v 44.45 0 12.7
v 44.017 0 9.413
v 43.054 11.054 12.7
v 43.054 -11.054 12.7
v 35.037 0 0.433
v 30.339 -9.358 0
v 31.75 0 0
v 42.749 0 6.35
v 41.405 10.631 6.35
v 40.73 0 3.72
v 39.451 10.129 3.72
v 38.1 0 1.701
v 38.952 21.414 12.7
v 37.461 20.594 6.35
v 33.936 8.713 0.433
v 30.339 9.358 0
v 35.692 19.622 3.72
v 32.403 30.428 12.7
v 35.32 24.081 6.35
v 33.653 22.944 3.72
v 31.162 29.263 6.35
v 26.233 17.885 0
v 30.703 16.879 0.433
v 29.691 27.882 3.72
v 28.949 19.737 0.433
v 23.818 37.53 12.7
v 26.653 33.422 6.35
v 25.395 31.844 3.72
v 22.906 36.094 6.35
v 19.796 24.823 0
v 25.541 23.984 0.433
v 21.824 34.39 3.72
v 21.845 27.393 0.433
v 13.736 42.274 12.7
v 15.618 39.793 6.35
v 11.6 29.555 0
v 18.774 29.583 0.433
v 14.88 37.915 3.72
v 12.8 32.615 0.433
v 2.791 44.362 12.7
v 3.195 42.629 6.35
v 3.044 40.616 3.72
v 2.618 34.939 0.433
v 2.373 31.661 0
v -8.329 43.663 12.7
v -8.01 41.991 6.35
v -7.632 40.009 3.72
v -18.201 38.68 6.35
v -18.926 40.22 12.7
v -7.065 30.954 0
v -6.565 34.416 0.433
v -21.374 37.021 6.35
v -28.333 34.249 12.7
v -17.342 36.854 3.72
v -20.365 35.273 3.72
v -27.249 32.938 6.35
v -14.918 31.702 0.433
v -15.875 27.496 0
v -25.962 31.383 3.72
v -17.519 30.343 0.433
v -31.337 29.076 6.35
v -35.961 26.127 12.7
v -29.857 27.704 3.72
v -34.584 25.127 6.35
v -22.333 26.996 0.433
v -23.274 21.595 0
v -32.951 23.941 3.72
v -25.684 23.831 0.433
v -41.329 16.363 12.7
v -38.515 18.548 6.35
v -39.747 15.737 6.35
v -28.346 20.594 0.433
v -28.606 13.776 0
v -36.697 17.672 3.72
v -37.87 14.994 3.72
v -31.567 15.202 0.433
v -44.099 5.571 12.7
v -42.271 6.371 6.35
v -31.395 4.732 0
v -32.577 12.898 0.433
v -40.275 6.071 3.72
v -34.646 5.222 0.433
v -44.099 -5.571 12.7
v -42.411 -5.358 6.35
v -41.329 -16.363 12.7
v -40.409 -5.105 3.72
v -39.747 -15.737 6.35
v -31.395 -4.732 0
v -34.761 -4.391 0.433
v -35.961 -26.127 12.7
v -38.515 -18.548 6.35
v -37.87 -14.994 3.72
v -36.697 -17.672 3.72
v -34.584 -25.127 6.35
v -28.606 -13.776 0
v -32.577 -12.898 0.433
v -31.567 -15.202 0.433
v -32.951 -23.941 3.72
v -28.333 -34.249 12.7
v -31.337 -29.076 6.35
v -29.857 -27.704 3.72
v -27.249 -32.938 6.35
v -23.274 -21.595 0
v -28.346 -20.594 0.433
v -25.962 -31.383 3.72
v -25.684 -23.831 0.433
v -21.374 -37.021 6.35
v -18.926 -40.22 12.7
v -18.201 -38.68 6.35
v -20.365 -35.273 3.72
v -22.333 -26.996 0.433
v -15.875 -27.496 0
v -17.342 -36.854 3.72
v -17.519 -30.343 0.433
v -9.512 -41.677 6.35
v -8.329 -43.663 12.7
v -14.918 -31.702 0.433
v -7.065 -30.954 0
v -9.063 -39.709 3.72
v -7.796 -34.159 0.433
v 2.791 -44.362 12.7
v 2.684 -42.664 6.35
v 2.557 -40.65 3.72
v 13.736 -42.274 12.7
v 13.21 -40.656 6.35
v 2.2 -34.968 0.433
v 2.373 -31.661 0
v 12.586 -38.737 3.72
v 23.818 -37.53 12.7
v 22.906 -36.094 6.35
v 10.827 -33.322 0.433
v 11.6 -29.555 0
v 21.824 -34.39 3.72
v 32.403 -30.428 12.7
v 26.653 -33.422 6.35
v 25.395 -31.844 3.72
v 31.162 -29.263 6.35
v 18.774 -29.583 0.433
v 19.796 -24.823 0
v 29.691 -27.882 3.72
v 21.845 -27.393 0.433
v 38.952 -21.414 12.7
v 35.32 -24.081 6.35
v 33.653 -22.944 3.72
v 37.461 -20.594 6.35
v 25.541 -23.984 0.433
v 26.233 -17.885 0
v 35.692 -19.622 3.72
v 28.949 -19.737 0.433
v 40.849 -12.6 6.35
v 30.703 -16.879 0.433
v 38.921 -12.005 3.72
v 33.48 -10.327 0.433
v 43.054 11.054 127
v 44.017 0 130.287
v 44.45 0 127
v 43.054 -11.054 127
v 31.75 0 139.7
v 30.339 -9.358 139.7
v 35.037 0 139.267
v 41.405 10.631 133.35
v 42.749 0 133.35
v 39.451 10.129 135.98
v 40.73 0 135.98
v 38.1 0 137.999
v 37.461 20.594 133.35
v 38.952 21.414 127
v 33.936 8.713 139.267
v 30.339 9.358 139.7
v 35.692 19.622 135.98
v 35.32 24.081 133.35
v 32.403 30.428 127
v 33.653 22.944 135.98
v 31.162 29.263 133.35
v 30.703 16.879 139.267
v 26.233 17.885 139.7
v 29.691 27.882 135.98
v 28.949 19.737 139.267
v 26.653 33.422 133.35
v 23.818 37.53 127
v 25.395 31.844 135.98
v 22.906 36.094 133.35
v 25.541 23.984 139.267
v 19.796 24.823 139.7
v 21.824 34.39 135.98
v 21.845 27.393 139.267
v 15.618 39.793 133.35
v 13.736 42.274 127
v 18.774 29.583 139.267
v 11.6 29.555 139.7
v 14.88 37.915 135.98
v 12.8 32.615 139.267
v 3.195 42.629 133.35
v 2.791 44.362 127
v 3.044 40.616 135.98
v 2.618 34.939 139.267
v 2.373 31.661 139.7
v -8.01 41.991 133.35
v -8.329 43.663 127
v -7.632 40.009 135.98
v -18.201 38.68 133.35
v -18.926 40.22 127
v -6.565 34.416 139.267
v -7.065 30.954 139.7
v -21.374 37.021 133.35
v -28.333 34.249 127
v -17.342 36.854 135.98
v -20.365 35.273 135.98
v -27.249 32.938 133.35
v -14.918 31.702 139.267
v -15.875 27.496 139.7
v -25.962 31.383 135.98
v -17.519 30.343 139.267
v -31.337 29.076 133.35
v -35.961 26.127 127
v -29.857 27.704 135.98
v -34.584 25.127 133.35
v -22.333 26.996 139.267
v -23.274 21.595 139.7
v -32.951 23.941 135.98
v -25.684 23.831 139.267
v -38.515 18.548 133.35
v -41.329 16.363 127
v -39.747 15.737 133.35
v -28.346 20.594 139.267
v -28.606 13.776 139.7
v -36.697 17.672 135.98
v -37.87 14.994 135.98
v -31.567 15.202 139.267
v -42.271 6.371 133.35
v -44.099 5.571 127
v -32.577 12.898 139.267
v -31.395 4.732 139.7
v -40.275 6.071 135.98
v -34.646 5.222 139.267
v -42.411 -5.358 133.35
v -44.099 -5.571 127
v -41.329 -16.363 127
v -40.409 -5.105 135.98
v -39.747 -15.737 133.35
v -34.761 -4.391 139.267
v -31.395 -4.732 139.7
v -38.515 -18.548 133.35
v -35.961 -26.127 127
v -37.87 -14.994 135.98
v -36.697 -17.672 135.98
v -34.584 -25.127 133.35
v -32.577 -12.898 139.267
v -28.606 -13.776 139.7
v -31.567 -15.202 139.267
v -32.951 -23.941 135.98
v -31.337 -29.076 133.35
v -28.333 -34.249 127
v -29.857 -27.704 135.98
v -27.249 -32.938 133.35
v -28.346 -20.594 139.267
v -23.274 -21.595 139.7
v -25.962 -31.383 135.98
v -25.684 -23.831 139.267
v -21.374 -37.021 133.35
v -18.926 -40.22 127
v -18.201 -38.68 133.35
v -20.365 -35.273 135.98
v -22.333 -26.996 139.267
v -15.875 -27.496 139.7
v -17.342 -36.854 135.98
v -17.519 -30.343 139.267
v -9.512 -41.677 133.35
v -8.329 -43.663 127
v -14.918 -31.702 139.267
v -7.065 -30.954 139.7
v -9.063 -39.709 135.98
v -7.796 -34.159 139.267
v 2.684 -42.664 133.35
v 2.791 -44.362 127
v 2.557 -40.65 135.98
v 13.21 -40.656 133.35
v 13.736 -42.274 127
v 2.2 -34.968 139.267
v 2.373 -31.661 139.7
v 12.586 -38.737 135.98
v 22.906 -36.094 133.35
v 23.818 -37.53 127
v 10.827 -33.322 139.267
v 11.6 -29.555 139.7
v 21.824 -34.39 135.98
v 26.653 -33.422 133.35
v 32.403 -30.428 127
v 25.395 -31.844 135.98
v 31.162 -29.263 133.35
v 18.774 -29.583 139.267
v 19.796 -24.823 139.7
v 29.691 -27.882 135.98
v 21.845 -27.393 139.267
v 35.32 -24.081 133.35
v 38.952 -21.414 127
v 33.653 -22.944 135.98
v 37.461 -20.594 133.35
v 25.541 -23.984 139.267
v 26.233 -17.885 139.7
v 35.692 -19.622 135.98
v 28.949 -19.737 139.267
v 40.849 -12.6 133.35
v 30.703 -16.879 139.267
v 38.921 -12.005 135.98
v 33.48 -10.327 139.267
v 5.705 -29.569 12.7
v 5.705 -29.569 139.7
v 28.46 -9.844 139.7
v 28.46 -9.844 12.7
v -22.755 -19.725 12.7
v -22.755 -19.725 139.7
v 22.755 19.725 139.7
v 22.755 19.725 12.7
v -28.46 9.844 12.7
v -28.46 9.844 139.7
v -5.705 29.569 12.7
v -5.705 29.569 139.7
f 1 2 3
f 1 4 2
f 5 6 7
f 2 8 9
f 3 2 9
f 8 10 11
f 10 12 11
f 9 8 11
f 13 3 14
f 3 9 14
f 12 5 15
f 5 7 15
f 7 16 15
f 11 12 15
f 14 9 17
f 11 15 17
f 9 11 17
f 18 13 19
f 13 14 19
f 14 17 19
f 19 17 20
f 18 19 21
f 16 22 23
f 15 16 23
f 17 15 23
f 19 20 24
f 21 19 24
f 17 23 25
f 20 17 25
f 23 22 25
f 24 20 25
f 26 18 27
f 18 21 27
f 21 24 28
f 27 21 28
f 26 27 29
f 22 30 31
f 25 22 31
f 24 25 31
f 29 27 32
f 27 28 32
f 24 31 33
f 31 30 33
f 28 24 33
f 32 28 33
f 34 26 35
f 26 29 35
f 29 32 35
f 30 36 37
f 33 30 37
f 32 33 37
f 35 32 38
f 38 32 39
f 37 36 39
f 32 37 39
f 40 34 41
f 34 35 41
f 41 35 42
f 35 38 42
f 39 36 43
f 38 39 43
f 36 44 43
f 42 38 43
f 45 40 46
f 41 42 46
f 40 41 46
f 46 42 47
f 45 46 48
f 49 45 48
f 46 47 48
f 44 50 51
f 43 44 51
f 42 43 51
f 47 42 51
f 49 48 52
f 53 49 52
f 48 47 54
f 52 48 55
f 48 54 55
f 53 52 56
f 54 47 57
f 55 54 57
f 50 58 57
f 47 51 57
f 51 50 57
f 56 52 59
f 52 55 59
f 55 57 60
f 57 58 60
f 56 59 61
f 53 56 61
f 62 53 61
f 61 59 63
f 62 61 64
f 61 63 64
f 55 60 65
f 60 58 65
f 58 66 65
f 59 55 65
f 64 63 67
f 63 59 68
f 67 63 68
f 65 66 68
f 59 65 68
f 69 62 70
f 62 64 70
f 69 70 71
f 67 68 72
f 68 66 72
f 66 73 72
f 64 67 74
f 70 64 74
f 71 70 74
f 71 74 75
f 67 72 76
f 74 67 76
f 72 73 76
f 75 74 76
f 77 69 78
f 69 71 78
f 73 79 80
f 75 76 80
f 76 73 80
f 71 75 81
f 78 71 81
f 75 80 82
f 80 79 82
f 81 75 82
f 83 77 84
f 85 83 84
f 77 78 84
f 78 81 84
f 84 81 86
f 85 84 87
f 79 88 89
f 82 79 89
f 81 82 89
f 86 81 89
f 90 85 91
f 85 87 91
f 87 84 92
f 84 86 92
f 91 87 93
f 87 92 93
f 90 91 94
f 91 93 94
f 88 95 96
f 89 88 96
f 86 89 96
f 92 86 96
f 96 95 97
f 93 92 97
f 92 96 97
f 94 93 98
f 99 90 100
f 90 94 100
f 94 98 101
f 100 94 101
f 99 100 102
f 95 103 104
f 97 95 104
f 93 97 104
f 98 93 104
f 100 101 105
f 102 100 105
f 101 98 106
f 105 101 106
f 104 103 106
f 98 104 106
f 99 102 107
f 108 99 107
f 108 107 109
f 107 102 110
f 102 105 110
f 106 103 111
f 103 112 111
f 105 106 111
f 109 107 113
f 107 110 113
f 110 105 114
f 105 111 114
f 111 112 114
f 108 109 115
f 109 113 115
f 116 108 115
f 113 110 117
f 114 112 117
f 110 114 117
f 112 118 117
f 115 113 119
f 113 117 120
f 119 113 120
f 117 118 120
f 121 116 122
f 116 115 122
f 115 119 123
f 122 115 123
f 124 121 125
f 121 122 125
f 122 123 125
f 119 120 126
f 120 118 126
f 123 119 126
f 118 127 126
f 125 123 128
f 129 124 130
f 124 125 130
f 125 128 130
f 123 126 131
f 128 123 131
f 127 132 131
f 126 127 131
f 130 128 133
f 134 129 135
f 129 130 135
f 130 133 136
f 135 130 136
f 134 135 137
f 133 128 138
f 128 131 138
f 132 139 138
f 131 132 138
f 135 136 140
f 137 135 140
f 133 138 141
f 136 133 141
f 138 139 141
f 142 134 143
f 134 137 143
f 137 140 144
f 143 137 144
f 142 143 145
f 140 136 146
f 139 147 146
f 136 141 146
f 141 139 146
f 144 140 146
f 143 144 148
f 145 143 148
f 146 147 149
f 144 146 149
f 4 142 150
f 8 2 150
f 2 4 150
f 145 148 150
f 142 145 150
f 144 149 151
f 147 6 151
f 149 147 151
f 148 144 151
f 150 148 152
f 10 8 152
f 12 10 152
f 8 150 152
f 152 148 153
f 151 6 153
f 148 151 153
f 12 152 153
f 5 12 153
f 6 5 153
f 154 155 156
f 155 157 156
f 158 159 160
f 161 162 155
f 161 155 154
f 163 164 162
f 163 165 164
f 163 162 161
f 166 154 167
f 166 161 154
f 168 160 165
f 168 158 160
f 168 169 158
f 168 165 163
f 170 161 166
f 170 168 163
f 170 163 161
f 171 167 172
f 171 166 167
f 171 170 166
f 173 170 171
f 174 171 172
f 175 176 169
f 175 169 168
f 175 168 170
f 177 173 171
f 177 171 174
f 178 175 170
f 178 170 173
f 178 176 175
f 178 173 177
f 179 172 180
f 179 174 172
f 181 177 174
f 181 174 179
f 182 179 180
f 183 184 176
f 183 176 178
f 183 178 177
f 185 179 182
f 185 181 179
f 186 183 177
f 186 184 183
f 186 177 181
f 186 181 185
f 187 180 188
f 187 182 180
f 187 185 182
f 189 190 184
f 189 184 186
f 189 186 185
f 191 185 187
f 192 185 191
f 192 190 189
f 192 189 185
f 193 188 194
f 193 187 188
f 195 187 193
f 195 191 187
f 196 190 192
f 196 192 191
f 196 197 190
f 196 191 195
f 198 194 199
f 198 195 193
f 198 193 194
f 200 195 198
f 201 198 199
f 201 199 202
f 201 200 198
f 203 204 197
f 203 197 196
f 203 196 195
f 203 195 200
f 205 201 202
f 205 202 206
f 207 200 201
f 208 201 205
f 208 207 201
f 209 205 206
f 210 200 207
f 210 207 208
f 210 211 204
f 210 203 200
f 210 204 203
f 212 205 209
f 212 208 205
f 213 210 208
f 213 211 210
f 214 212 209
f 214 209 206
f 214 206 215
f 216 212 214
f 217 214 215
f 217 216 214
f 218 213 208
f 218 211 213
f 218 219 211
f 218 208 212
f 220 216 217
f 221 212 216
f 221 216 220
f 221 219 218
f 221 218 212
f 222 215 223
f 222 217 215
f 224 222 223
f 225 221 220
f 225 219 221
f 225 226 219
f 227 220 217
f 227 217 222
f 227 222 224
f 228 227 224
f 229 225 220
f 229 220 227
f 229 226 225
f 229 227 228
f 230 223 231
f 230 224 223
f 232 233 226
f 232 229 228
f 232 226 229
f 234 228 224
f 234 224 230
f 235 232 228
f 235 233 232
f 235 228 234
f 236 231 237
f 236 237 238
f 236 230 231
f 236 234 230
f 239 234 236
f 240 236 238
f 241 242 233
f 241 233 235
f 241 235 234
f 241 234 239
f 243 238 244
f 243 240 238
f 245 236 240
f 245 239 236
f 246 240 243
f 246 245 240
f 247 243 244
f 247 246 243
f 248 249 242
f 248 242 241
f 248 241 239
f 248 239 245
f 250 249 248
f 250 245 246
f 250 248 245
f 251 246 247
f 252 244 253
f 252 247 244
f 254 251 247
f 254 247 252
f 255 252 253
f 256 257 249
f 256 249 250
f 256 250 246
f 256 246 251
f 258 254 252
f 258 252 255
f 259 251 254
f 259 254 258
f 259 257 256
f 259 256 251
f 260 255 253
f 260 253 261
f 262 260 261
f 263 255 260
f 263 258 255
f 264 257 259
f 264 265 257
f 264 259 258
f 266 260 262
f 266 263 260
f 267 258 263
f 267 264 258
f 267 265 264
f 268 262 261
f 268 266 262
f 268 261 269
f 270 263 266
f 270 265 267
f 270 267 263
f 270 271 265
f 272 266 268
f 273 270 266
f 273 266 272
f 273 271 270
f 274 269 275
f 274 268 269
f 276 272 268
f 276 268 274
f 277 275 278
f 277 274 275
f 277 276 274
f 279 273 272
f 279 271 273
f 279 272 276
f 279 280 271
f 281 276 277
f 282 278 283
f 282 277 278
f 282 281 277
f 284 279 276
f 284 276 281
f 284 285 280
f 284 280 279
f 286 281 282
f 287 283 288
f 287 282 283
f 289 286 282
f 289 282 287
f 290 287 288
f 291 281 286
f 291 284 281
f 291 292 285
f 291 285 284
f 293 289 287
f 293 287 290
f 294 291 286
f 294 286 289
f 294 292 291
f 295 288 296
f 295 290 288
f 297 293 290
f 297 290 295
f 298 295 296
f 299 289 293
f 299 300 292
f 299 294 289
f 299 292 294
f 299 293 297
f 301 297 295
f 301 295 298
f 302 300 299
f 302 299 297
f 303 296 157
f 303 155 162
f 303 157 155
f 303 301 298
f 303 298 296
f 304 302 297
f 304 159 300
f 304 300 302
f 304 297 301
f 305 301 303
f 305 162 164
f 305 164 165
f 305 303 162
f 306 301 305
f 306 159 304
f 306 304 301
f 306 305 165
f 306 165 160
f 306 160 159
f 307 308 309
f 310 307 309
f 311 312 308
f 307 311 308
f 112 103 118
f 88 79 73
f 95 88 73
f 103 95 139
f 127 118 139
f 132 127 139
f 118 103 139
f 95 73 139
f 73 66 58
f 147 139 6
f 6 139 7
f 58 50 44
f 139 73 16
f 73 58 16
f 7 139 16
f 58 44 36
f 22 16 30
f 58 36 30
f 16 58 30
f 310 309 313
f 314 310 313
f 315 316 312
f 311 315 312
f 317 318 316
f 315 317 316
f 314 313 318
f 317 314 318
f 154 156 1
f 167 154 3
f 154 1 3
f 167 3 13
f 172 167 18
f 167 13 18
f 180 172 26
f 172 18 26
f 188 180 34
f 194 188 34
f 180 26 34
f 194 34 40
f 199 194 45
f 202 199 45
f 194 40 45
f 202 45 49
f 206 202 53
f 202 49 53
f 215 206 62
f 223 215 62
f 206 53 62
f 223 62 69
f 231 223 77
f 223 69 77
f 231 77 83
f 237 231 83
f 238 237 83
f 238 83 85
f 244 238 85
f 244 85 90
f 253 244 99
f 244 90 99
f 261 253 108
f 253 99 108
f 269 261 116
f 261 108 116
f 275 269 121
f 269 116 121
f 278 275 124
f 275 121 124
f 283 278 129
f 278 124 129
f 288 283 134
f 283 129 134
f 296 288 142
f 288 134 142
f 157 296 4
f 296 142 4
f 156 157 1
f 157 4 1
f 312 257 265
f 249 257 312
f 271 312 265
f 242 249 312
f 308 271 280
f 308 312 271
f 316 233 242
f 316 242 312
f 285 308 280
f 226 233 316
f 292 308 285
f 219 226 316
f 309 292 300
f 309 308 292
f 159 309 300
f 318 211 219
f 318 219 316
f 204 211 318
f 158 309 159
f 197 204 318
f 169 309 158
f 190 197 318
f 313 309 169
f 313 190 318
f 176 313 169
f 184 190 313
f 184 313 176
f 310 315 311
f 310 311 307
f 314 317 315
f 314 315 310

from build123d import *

# Parameters (mm, degrees)
F0_R     = 44.45
F1_DEPTH = 139.7
F2_R     = 12.7
F3_R     = 22.915051
F4_DEPTH = 127
F6_DEPTH = 127


with BuildPart() as f1:
    # F0 (on Top) → F1 (new body)
    with BuildSketch(Plane.XY):
        Circle(F0_R)
    extrude(amount=F1_DEPTH)

    # F2
    f2_edges = [f1.edges().sort_by_distance(p)[0] for p in [
        (-44.45, 0, 0),
        (-44.45, 0, 139.7),
    ]]
    fillet(f2_edges, radius=F2_R)

    # F3 (on face) → F4 (cut)
    with BuildSketch(Plane.XY.offset(139.7)):
        Circle(F3_R)
    extrude(amount=-F4_DEPTH, mode=Mode.SUBTRACT)

    # F5 (on face) → F6 (cut)
    with BuildSketch(Plane.XY.offset(139.7)):
        Polygon((28.460228, -9.844098), (22.755353, 19.725232), (-5.704875, 29.56933), (-28.460228, 9.844098), (-22.755353, -19.725232), (5.704875, -29.56933), align=None)
    extrude(amount=-F6_DEPTH, mode=Mode.SUBTRACT)


solid = f1.part
